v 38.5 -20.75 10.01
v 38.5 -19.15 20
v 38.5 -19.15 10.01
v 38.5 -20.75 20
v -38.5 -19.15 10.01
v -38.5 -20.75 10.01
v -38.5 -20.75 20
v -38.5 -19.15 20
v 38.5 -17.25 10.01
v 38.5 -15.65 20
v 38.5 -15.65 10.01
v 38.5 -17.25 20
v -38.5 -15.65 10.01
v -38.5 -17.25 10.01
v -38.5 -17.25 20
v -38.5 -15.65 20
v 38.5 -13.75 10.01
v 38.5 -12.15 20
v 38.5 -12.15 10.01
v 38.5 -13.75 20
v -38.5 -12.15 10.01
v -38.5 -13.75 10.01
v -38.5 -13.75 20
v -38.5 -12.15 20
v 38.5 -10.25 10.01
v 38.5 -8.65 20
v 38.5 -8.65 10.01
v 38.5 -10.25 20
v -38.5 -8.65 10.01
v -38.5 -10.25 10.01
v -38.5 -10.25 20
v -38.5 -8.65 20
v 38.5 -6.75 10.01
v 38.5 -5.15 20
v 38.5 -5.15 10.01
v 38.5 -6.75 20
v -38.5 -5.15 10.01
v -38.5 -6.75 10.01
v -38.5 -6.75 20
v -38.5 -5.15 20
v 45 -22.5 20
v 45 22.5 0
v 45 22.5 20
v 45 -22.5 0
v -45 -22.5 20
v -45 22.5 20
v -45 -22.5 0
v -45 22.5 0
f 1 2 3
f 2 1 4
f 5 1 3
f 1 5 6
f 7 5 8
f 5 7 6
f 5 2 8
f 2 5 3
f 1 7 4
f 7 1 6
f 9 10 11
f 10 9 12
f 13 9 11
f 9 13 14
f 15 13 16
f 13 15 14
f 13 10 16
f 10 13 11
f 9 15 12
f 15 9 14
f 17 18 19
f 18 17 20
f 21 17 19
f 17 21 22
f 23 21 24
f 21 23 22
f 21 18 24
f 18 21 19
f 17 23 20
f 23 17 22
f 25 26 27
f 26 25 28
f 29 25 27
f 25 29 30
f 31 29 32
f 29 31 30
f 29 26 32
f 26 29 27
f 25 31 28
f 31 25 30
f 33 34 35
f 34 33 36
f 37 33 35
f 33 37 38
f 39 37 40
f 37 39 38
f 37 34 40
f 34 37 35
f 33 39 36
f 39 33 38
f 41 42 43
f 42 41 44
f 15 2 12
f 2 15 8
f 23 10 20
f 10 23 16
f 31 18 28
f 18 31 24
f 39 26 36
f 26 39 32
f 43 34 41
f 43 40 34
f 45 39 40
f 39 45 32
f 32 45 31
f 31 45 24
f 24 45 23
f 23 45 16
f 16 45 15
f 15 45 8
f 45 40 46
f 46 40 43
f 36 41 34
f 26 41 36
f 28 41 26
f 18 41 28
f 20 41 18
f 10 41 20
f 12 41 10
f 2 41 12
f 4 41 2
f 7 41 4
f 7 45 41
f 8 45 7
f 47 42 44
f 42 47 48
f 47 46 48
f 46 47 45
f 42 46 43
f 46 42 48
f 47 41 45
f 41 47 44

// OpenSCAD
// --- Dimensions (mm) ---
block_length = 90;      // X dimension of the base block
block_width = 45;       // Y dimension of the base block
block_height = 20;      // Z dimension of the base block

slide_length = 75;      // Length of the slide (X direction)
slide_width = 25;       // Width of the slide (Y direction)
slide_thickness = 1;    // Thickness of the slide (Z direction)

slot_count = 10;         // Number of slots
slot_length = 77;       // Length of the slot (X direction)
slot_width = 1.6;       // Width of the slot (Y direction)
slot_depth = 10;        // Depth of the slot (Z direction)
slot_spacing = 3.5;     // Center-to-center distance between slots (Y direction)

// --- Resolution ---
$fn = 64;

// --- Implementation ---

// The user requested the part to rest on the XY plane at Z = 0.
// In the previous version, the center-based cube logic caused the 
// bottom to be at Z = -10. We must translate the object so the 
// bottom face (Z_min) is at Z = 0.

module drying_rack() {
    difference() {
        // Main block body
        // We create the cube starting from Z=0 to avoid negative Z coordinates.
        cube([block_length, block_width, block_height]);

        // Generate the slots
        for (i = [0 : slot_count - 1]) {
            // Calculate Y position for the center of the current slot
            // The group of slots is centered on the block in Y.
            // Total span of centers is (slot_count - 1) * slot_spacing.
            y_offset = (i * slot_spacing) - ((slot_count - 1) * slot_spacing / 2);
            
            // The slots are centered on the block in X.
            // The block is 90mm long, slot is 77mm. 
            // X-offset = (90 - 77) / 2 = 6.5
            x_offset = (block_length - slot_length) / 2;
            
            // The slots are cut into the top face.
            // Top face is at Z = block_height.
            // We cut from Z = block_height down to Z = block_height - slot_depth.
            // To ensure a clean cut, we extend the cutting shape slightly.
            translate([x_offset, y_offset, block_height - slot_depth + 0.01]) {
                cube([slot_length, slot_width, slot_depth + 0.01]);
            }
        }
    }
}

// Final assembly:
// To center the part on the origin in X and Y:
// X_offset = -block_length / 2
// Y_offset = -block_width / 2
// Z_offset = 0 (since the cube starts at 0)

translate([-block_length/2, -block_width/2, 0]) {
    drying_rack();
}
